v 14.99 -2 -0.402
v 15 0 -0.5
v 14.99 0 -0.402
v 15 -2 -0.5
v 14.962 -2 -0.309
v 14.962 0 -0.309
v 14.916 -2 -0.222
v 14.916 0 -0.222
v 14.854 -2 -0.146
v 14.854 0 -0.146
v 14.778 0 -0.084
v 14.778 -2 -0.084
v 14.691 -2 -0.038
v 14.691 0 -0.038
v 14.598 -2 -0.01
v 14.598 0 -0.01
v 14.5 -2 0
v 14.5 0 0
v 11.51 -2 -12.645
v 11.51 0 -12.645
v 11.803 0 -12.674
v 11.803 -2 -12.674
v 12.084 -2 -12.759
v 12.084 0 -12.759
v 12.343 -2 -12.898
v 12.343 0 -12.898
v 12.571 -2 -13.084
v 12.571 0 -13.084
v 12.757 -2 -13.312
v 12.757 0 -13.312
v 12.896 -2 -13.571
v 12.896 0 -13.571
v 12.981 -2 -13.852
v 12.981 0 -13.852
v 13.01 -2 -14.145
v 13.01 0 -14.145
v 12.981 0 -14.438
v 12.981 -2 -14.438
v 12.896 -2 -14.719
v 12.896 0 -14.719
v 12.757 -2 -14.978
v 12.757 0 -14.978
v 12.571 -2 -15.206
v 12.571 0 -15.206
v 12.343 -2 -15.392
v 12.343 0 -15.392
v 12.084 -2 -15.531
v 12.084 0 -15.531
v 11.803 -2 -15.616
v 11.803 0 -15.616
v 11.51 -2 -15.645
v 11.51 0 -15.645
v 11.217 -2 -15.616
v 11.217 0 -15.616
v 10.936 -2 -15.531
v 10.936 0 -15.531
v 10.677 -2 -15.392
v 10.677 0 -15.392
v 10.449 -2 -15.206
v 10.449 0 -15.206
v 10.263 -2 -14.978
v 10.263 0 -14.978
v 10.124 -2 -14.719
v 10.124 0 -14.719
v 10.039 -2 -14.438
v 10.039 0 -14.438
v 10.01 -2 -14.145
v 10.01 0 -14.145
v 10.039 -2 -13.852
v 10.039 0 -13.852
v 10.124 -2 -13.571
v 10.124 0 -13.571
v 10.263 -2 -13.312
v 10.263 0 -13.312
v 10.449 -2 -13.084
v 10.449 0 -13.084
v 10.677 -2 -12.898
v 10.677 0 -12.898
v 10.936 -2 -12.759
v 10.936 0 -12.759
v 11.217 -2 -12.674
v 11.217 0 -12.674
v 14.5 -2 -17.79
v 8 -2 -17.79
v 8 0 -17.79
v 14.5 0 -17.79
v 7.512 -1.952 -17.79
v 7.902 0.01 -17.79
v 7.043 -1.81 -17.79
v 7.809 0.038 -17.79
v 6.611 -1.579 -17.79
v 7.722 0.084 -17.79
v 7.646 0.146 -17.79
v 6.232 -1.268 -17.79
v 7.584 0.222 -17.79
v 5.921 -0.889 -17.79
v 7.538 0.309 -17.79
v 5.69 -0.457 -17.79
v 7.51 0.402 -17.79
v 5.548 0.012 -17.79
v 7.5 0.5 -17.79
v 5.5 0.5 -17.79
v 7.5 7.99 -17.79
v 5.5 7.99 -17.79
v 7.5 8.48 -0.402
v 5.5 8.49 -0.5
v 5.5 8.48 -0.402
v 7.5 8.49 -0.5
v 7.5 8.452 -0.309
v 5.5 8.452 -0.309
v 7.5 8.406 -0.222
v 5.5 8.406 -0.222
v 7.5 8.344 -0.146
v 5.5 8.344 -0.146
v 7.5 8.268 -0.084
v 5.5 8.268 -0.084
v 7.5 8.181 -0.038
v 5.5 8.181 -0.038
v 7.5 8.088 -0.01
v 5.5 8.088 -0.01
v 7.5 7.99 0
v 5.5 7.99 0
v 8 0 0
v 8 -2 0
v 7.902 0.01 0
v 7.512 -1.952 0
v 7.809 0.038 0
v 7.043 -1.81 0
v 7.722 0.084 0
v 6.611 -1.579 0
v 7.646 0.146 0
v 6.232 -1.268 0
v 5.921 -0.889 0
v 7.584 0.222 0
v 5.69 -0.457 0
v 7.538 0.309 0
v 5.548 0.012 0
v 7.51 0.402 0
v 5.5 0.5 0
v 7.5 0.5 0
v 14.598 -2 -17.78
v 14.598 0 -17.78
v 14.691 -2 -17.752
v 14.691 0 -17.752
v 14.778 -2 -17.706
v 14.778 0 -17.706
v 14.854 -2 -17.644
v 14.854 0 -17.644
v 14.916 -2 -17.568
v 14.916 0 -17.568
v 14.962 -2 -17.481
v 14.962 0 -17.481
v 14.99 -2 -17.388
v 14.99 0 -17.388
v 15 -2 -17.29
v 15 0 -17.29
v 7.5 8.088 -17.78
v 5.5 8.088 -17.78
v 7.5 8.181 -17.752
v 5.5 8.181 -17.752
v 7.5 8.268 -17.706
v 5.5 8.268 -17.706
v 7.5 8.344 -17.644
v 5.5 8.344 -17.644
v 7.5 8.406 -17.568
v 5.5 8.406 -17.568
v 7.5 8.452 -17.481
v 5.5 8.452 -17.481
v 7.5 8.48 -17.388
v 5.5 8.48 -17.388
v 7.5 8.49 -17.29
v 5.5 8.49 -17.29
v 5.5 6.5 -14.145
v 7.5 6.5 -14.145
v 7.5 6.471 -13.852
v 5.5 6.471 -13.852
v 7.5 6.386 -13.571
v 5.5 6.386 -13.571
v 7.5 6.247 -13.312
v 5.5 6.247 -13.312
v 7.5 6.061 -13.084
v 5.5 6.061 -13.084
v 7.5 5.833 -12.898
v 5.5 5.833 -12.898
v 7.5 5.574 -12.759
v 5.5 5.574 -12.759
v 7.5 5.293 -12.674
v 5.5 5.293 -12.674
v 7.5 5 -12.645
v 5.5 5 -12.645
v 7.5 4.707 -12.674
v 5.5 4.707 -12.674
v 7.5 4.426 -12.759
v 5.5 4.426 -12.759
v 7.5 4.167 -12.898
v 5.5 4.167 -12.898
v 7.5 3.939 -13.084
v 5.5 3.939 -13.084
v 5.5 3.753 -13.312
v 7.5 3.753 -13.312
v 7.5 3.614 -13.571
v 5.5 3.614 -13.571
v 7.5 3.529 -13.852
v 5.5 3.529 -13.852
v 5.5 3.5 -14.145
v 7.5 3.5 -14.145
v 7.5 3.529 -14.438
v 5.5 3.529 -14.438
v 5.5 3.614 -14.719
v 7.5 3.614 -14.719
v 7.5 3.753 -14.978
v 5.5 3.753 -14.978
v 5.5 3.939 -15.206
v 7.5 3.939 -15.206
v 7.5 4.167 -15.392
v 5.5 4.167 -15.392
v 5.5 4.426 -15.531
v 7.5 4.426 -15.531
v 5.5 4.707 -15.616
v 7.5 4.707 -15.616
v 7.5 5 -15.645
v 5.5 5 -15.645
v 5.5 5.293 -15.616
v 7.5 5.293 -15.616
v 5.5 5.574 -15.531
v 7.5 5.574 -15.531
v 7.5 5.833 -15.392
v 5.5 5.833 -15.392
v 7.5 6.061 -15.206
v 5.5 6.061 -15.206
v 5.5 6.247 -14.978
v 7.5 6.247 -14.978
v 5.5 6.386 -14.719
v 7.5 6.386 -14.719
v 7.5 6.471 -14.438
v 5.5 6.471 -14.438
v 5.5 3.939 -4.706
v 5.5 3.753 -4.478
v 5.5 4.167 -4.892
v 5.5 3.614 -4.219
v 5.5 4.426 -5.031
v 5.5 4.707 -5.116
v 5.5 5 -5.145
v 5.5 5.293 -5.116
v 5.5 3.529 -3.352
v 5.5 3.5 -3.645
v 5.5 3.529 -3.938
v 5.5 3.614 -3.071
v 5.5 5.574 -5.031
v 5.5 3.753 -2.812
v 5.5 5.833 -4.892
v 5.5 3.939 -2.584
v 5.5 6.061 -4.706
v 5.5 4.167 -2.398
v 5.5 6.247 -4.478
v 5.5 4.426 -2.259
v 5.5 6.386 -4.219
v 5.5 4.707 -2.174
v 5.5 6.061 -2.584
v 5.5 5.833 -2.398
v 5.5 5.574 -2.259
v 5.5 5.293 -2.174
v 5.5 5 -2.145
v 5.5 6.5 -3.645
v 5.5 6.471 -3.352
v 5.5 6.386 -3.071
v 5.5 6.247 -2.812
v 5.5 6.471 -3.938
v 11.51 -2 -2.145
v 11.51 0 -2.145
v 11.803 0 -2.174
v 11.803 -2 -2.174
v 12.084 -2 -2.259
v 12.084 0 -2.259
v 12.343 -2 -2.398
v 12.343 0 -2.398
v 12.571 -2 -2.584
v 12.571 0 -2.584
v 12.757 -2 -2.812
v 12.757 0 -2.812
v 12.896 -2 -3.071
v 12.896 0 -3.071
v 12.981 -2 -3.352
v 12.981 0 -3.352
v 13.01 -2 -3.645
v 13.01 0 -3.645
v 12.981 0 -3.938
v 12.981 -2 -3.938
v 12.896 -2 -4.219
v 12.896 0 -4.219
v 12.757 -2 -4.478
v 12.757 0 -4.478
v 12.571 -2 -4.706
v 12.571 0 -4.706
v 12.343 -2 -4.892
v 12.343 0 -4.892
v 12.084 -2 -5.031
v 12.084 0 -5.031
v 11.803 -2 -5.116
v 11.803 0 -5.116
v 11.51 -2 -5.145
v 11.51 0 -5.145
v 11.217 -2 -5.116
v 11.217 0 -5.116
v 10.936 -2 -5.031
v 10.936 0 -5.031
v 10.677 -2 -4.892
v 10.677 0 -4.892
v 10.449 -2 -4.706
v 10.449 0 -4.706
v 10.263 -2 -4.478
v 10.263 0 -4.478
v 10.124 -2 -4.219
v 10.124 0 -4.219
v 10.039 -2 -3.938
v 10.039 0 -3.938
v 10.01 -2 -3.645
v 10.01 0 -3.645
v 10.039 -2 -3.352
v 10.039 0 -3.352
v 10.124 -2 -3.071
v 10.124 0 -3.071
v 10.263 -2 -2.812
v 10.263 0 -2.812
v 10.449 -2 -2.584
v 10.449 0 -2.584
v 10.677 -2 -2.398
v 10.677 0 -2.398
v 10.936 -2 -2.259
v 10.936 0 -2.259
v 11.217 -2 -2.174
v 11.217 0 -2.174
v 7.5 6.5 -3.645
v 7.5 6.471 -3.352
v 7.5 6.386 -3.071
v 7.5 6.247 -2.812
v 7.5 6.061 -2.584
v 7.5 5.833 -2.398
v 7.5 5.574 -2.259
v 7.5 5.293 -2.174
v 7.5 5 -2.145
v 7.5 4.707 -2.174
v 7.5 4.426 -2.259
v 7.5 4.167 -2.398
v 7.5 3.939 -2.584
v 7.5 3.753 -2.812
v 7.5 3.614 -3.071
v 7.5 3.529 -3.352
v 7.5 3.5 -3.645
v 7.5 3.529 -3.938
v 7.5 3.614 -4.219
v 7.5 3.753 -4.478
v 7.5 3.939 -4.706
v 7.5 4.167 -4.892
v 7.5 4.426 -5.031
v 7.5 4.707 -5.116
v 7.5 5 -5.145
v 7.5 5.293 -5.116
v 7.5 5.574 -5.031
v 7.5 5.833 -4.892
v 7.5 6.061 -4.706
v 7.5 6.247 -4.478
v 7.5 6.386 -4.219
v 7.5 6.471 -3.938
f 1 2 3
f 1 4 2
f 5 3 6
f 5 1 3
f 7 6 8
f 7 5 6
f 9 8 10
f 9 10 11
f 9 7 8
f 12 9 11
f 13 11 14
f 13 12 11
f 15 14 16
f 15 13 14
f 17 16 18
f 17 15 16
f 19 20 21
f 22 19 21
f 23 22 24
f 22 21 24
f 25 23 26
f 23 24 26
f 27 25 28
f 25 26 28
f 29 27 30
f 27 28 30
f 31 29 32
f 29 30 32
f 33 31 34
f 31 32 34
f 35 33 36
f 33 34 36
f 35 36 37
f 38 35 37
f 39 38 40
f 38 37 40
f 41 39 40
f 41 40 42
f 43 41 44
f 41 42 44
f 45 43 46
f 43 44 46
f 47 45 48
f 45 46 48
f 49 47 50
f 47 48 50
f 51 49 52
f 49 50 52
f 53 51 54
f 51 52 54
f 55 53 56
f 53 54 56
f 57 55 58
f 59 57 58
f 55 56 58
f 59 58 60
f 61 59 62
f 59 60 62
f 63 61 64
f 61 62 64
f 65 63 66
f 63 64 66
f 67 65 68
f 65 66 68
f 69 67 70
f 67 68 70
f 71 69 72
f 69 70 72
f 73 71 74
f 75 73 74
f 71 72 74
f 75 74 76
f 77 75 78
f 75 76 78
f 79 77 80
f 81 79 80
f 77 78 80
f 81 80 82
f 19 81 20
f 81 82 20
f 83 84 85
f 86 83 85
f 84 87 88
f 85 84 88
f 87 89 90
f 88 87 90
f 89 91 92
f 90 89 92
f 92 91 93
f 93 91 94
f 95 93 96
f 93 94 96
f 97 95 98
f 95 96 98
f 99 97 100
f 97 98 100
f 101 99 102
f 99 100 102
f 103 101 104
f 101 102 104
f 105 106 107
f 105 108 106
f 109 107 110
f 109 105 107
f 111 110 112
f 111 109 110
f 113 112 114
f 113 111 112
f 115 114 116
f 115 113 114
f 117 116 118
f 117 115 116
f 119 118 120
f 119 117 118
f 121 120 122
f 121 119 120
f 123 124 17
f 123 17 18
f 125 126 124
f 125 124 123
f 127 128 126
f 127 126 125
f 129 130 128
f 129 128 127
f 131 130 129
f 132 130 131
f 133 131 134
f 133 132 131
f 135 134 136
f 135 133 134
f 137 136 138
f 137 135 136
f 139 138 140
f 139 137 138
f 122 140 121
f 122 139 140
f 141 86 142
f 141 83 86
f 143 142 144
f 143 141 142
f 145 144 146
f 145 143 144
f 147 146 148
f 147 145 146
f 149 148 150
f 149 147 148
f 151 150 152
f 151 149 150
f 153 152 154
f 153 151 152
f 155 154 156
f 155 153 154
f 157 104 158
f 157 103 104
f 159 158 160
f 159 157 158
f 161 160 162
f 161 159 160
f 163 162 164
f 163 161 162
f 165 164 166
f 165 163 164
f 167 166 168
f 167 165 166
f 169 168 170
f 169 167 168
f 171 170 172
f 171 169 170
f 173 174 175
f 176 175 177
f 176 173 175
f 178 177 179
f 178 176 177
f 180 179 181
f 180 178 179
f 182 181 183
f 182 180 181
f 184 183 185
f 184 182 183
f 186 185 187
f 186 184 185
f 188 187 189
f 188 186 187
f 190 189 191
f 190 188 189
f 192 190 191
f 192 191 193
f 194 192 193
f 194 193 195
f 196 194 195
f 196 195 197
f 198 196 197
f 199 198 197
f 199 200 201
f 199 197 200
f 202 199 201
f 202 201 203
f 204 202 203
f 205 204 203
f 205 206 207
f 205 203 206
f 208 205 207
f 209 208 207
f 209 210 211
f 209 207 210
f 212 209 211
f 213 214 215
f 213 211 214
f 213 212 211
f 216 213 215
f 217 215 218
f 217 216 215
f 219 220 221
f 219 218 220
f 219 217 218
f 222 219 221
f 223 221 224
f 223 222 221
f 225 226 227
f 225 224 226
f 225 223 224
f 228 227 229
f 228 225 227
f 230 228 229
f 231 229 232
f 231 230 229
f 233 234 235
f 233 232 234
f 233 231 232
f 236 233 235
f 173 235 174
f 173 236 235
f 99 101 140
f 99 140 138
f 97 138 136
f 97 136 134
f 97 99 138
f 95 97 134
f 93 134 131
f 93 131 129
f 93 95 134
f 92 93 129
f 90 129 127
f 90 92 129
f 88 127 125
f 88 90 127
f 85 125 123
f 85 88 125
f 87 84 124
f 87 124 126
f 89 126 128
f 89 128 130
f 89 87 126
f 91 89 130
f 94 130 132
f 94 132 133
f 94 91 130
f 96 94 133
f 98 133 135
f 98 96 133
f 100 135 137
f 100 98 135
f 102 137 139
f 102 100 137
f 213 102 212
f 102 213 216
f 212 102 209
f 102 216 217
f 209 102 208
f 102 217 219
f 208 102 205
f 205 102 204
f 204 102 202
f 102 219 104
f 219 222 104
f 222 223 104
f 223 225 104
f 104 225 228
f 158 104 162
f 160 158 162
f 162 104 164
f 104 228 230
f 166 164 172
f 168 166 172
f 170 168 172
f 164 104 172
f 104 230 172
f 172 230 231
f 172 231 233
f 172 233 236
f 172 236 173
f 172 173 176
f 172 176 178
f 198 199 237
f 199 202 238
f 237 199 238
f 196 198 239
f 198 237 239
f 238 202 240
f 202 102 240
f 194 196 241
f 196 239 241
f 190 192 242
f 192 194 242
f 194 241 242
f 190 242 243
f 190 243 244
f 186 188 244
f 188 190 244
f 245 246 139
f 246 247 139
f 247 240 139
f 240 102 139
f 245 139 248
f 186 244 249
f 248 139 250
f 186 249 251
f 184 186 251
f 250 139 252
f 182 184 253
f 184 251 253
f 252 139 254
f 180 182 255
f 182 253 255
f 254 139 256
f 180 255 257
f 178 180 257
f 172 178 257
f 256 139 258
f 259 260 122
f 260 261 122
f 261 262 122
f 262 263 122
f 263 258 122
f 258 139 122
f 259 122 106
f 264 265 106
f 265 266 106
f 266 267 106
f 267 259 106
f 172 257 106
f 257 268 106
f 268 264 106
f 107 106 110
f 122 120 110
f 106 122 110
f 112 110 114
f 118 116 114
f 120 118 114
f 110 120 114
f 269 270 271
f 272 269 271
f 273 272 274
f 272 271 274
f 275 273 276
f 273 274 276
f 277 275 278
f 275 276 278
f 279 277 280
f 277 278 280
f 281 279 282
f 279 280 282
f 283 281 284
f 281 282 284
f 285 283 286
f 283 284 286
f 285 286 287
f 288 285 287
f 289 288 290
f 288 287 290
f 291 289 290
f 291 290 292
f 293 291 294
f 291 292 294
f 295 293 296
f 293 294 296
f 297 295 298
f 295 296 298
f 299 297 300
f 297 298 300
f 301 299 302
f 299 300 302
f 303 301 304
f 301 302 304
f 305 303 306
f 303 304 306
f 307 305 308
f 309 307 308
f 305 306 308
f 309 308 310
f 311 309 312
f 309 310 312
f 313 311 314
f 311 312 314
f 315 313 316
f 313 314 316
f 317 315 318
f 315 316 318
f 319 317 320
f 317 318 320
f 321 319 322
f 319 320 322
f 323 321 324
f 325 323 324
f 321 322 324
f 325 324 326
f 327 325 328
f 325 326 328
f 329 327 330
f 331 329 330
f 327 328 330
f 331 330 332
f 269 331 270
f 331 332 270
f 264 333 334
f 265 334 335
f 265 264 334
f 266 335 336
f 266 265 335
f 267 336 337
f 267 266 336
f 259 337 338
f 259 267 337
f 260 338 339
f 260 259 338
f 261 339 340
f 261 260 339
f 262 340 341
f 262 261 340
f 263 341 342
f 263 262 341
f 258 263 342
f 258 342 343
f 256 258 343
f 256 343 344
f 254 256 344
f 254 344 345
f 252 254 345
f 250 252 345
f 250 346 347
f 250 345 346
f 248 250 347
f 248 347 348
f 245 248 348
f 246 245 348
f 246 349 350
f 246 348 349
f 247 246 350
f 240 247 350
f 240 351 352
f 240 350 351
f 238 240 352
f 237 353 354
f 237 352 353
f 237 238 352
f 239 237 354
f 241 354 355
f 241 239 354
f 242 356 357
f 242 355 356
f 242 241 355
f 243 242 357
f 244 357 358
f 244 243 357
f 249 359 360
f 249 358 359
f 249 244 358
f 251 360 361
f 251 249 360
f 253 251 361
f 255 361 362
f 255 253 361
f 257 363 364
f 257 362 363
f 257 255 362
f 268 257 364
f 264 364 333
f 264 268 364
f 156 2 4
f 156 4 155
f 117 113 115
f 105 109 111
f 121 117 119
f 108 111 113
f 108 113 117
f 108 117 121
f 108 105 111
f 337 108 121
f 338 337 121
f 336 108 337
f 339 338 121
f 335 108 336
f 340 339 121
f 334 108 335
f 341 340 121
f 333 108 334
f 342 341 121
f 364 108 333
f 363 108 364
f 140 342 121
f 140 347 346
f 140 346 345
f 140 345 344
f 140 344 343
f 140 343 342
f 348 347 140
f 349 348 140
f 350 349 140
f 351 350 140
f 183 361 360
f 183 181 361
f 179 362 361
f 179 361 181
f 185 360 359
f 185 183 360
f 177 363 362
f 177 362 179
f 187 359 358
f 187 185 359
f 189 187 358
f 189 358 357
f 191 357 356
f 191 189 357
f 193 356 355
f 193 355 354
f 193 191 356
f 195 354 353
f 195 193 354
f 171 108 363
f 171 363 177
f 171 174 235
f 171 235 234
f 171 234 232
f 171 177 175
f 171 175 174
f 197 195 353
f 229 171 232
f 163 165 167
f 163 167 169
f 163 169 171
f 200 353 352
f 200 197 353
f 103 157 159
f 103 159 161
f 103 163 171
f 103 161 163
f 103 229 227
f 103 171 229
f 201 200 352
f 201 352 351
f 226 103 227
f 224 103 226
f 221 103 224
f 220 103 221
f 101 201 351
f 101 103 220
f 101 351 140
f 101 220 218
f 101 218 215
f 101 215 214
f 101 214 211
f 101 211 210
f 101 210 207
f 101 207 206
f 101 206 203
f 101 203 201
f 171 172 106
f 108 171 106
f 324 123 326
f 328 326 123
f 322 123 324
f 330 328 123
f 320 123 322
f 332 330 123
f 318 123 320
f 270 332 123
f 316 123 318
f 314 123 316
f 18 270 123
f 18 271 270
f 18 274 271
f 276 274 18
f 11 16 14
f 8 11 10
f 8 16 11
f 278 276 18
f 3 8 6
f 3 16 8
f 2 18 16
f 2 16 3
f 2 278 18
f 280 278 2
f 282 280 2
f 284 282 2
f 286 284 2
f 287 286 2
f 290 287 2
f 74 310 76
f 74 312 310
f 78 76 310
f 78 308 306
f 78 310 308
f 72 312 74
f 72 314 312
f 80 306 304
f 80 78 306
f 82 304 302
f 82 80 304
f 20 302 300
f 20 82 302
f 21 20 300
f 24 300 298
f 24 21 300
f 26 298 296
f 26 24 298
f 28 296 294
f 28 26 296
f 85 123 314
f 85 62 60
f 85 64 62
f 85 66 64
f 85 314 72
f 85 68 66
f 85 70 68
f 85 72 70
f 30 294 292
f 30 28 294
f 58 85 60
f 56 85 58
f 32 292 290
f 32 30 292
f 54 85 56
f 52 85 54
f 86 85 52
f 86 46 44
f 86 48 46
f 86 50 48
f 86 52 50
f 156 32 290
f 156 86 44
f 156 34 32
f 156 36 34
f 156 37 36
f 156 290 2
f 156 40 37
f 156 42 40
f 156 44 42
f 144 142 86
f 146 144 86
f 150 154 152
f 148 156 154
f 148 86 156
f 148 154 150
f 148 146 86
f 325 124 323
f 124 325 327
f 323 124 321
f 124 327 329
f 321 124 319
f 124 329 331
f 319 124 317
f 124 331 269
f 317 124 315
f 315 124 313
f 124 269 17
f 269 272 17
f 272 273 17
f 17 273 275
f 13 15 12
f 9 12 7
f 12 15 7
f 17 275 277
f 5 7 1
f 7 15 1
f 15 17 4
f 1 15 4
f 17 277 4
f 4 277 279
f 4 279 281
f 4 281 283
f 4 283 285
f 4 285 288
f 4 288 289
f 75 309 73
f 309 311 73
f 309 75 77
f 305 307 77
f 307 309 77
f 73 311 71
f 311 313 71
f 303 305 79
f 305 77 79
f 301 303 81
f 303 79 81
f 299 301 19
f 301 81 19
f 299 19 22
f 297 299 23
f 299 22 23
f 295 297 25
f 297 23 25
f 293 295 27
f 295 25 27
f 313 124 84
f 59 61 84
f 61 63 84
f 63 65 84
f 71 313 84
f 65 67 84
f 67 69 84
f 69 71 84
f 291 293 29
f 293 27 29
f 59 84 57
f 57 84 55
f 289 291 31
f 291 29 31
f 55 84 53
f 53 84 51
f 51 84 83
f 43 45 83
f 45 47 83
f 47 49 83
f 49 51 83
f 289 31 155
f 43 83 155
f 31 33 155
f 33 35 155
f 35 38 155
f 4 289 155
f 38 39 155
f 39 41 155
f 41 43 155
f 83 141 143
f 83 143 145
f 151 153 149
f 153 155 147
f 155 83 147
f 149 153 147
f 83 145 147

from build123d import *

# Parameters (mm, degrees)
SKETCH2_W                  = 15
SKETCH2_H                  = 17.79
SKETCH2_R                  = 1.5
BASE_FLANGE1_DEPTH         = 2
SKETCHED_BEND6_OUTLINE_W   = 2
SKETCHED_BEND6_OUTLINE_H   = 17.79
SKETCHED_BEND6_DEPTH       = 5.5
SKETCHED_START             = 5.74315
SKETCHED_BEND6_2_OUTLINE_W = 8.49
SKETCHED_BEND6_2_OUTLINE_H = 17.79
SKETCHED_BEND6_2_OUTLINE_R = 1.5
SKETCHED_BEND6_2_DEPTH     = 1.75685
SKETCHED_START_2           = 5.5
SKETCHED_BEND6_3_OUTLINE_W = 8.49
SKETCHED_BEND6_3_OUTLINE_H = 17.79
SKETCHED_BEND6_3_OUTLINE_R = 1.5
SKETCHED_BEND6_3_DEPTH     = 2.5
SKETCHED_START_3           = -17.79
SKETCHED_BEND6_4_DEPTH     = 17.79
FILLET1_R                  = 0.5


with BuildPart() as part:
    # Base-Flange1: sheet metal written as solids
    # Sketch2 → Base-Flange1 (new body)
    with BuildSketch(Plane(origin=(0, 0, 0), x_dir=(1, 0, 0), z_dir=(0, 1, 0))):
        with Locations((7.5, 8.895)):
            Rectangle(SKETCH2_W, SKETCH2_H)
        with Locations(Location((11.51, 14.145, 0), (0, 0, 270))):
            Circle(SKETCH2_R, mode=Mode.SUBTRACT)
        with Locations(Location((11.51, 3.645, 0), (0, 0, 270))):
            Circle(SKETCH2_R, mode=Mode.SUBTRACT)
        with Locations(Location((3.49, 3.645, 0), (0, 0, 270))):
            Circle(SKETCH2_R, mode=Mode.SUBTRACT)
        with Locations(Location((3.49, 14.145, 0), (0, 0, 270))):
            Circle(SKETCH2_R, mode=Mode.SUBTRACT)
    extrude(amount=-BASE_FLANGE1_DEPTH)

    # Sketched Bend6: read off the stored shape, not the designer's step
    # Sketched Bend6 outline → Sketched Bend6 (cut)
    with BuildSketch(Plane.YZ):
        with Locations((-1, -8.895)):
            Rectangle(SKETCHED_BEND6_OUTLINE_W, SKETCHED_BEND6_OUTLINE_H)
    extrude(amount=SKETCHED_BEND6_DEPTH, mode=Mode.SUBTRACT)

    # Sketched Bend6 2 outline → Sketched Bend6 2 (add)
    with BuildSketch(Plane.YZ.offset(SKETCHED_START)):
        with Locations((4.245, -8.895)):
            Rectangle(SKETCHED_BEND6_2_OUTLINE_W, SKETCHED_BEND6_2_OUTLINE_H)
        with Locations((5, -14.145)):
            Circle(SKETCHED_BEND6_2_OUTLINE_R, mode=Mode.SUBTRACT)
        with Locations((5, -3.645)):
            Circle(SKETCHED_BEND6_2_OUTLINE_R, mode=Mode.SUBTRACT)
    extrude(amount=SKETCHED_BEND6_2_DEPTH)

    # Sketched Bend6 3 outline → Sketched Bend6 3 (add)
    with BuildSketch(Plane.YZ.offset(SKETCHED_START_2)):
        with Locations((4.245, -8.895)):
            Rectangle(SKETCHED_BEND6_3_OUTLINE_W, SKETCHED_BEND6_3_OUTLINE_H)
        with Locations((5, -14.145)):
            Circle(SKETCHED_BEND6_3_OUTLINE_R, mode=Mode.SUBTRACT)
        with Locations((5, -3.645)):
            Circle(SKETCHED_BEND6_3_OUTLINE_R, mode=Mode.SUBTRACT)
    extrude(amount=SKETCHED_BEND6_3_DEPTH)

    # Sketched Bend6 4 outline → Sketched Bend6 4 (cut)
    with BuildSketch(Plane.XY.offset(SKETCHED_START_3)):
        with BuildLine():
            Line((8, 8.49), (7.5, 8.49))
            Line((7.5, 8.49), (7.5, 0.5))
            ThreePointArc((7.5, 0.5), (7.646446609, 0.146446609), (8, 0))
            Line((8, 0), (8, 8.49))
        make_face()
        with BuildLine():
            ThreePointArc((8, -2), (6.232233047, -1.267766953), (5.5, 0.5))
            Line((5.5, 0.5), (5.5, -2))
            Line((5.5, -2), (8, -2))
        make_face()
    extrude(amount=SKETCHED_BEND6_4_DEPTH, mode=Mode.SUBTRACT)

    # Fillet1
    fillet1_edges = [part.edges().sort_by_distance(p)[0] for p in [
        (15, -1, -17.79),
        (15, -1, 0),
        (6.5, 8.49, -17.79),
        (6.5, 8.49, 0),
    ]]
    fillet(fillet1_edges, radius=FILLET1_R)


solid = part.part
